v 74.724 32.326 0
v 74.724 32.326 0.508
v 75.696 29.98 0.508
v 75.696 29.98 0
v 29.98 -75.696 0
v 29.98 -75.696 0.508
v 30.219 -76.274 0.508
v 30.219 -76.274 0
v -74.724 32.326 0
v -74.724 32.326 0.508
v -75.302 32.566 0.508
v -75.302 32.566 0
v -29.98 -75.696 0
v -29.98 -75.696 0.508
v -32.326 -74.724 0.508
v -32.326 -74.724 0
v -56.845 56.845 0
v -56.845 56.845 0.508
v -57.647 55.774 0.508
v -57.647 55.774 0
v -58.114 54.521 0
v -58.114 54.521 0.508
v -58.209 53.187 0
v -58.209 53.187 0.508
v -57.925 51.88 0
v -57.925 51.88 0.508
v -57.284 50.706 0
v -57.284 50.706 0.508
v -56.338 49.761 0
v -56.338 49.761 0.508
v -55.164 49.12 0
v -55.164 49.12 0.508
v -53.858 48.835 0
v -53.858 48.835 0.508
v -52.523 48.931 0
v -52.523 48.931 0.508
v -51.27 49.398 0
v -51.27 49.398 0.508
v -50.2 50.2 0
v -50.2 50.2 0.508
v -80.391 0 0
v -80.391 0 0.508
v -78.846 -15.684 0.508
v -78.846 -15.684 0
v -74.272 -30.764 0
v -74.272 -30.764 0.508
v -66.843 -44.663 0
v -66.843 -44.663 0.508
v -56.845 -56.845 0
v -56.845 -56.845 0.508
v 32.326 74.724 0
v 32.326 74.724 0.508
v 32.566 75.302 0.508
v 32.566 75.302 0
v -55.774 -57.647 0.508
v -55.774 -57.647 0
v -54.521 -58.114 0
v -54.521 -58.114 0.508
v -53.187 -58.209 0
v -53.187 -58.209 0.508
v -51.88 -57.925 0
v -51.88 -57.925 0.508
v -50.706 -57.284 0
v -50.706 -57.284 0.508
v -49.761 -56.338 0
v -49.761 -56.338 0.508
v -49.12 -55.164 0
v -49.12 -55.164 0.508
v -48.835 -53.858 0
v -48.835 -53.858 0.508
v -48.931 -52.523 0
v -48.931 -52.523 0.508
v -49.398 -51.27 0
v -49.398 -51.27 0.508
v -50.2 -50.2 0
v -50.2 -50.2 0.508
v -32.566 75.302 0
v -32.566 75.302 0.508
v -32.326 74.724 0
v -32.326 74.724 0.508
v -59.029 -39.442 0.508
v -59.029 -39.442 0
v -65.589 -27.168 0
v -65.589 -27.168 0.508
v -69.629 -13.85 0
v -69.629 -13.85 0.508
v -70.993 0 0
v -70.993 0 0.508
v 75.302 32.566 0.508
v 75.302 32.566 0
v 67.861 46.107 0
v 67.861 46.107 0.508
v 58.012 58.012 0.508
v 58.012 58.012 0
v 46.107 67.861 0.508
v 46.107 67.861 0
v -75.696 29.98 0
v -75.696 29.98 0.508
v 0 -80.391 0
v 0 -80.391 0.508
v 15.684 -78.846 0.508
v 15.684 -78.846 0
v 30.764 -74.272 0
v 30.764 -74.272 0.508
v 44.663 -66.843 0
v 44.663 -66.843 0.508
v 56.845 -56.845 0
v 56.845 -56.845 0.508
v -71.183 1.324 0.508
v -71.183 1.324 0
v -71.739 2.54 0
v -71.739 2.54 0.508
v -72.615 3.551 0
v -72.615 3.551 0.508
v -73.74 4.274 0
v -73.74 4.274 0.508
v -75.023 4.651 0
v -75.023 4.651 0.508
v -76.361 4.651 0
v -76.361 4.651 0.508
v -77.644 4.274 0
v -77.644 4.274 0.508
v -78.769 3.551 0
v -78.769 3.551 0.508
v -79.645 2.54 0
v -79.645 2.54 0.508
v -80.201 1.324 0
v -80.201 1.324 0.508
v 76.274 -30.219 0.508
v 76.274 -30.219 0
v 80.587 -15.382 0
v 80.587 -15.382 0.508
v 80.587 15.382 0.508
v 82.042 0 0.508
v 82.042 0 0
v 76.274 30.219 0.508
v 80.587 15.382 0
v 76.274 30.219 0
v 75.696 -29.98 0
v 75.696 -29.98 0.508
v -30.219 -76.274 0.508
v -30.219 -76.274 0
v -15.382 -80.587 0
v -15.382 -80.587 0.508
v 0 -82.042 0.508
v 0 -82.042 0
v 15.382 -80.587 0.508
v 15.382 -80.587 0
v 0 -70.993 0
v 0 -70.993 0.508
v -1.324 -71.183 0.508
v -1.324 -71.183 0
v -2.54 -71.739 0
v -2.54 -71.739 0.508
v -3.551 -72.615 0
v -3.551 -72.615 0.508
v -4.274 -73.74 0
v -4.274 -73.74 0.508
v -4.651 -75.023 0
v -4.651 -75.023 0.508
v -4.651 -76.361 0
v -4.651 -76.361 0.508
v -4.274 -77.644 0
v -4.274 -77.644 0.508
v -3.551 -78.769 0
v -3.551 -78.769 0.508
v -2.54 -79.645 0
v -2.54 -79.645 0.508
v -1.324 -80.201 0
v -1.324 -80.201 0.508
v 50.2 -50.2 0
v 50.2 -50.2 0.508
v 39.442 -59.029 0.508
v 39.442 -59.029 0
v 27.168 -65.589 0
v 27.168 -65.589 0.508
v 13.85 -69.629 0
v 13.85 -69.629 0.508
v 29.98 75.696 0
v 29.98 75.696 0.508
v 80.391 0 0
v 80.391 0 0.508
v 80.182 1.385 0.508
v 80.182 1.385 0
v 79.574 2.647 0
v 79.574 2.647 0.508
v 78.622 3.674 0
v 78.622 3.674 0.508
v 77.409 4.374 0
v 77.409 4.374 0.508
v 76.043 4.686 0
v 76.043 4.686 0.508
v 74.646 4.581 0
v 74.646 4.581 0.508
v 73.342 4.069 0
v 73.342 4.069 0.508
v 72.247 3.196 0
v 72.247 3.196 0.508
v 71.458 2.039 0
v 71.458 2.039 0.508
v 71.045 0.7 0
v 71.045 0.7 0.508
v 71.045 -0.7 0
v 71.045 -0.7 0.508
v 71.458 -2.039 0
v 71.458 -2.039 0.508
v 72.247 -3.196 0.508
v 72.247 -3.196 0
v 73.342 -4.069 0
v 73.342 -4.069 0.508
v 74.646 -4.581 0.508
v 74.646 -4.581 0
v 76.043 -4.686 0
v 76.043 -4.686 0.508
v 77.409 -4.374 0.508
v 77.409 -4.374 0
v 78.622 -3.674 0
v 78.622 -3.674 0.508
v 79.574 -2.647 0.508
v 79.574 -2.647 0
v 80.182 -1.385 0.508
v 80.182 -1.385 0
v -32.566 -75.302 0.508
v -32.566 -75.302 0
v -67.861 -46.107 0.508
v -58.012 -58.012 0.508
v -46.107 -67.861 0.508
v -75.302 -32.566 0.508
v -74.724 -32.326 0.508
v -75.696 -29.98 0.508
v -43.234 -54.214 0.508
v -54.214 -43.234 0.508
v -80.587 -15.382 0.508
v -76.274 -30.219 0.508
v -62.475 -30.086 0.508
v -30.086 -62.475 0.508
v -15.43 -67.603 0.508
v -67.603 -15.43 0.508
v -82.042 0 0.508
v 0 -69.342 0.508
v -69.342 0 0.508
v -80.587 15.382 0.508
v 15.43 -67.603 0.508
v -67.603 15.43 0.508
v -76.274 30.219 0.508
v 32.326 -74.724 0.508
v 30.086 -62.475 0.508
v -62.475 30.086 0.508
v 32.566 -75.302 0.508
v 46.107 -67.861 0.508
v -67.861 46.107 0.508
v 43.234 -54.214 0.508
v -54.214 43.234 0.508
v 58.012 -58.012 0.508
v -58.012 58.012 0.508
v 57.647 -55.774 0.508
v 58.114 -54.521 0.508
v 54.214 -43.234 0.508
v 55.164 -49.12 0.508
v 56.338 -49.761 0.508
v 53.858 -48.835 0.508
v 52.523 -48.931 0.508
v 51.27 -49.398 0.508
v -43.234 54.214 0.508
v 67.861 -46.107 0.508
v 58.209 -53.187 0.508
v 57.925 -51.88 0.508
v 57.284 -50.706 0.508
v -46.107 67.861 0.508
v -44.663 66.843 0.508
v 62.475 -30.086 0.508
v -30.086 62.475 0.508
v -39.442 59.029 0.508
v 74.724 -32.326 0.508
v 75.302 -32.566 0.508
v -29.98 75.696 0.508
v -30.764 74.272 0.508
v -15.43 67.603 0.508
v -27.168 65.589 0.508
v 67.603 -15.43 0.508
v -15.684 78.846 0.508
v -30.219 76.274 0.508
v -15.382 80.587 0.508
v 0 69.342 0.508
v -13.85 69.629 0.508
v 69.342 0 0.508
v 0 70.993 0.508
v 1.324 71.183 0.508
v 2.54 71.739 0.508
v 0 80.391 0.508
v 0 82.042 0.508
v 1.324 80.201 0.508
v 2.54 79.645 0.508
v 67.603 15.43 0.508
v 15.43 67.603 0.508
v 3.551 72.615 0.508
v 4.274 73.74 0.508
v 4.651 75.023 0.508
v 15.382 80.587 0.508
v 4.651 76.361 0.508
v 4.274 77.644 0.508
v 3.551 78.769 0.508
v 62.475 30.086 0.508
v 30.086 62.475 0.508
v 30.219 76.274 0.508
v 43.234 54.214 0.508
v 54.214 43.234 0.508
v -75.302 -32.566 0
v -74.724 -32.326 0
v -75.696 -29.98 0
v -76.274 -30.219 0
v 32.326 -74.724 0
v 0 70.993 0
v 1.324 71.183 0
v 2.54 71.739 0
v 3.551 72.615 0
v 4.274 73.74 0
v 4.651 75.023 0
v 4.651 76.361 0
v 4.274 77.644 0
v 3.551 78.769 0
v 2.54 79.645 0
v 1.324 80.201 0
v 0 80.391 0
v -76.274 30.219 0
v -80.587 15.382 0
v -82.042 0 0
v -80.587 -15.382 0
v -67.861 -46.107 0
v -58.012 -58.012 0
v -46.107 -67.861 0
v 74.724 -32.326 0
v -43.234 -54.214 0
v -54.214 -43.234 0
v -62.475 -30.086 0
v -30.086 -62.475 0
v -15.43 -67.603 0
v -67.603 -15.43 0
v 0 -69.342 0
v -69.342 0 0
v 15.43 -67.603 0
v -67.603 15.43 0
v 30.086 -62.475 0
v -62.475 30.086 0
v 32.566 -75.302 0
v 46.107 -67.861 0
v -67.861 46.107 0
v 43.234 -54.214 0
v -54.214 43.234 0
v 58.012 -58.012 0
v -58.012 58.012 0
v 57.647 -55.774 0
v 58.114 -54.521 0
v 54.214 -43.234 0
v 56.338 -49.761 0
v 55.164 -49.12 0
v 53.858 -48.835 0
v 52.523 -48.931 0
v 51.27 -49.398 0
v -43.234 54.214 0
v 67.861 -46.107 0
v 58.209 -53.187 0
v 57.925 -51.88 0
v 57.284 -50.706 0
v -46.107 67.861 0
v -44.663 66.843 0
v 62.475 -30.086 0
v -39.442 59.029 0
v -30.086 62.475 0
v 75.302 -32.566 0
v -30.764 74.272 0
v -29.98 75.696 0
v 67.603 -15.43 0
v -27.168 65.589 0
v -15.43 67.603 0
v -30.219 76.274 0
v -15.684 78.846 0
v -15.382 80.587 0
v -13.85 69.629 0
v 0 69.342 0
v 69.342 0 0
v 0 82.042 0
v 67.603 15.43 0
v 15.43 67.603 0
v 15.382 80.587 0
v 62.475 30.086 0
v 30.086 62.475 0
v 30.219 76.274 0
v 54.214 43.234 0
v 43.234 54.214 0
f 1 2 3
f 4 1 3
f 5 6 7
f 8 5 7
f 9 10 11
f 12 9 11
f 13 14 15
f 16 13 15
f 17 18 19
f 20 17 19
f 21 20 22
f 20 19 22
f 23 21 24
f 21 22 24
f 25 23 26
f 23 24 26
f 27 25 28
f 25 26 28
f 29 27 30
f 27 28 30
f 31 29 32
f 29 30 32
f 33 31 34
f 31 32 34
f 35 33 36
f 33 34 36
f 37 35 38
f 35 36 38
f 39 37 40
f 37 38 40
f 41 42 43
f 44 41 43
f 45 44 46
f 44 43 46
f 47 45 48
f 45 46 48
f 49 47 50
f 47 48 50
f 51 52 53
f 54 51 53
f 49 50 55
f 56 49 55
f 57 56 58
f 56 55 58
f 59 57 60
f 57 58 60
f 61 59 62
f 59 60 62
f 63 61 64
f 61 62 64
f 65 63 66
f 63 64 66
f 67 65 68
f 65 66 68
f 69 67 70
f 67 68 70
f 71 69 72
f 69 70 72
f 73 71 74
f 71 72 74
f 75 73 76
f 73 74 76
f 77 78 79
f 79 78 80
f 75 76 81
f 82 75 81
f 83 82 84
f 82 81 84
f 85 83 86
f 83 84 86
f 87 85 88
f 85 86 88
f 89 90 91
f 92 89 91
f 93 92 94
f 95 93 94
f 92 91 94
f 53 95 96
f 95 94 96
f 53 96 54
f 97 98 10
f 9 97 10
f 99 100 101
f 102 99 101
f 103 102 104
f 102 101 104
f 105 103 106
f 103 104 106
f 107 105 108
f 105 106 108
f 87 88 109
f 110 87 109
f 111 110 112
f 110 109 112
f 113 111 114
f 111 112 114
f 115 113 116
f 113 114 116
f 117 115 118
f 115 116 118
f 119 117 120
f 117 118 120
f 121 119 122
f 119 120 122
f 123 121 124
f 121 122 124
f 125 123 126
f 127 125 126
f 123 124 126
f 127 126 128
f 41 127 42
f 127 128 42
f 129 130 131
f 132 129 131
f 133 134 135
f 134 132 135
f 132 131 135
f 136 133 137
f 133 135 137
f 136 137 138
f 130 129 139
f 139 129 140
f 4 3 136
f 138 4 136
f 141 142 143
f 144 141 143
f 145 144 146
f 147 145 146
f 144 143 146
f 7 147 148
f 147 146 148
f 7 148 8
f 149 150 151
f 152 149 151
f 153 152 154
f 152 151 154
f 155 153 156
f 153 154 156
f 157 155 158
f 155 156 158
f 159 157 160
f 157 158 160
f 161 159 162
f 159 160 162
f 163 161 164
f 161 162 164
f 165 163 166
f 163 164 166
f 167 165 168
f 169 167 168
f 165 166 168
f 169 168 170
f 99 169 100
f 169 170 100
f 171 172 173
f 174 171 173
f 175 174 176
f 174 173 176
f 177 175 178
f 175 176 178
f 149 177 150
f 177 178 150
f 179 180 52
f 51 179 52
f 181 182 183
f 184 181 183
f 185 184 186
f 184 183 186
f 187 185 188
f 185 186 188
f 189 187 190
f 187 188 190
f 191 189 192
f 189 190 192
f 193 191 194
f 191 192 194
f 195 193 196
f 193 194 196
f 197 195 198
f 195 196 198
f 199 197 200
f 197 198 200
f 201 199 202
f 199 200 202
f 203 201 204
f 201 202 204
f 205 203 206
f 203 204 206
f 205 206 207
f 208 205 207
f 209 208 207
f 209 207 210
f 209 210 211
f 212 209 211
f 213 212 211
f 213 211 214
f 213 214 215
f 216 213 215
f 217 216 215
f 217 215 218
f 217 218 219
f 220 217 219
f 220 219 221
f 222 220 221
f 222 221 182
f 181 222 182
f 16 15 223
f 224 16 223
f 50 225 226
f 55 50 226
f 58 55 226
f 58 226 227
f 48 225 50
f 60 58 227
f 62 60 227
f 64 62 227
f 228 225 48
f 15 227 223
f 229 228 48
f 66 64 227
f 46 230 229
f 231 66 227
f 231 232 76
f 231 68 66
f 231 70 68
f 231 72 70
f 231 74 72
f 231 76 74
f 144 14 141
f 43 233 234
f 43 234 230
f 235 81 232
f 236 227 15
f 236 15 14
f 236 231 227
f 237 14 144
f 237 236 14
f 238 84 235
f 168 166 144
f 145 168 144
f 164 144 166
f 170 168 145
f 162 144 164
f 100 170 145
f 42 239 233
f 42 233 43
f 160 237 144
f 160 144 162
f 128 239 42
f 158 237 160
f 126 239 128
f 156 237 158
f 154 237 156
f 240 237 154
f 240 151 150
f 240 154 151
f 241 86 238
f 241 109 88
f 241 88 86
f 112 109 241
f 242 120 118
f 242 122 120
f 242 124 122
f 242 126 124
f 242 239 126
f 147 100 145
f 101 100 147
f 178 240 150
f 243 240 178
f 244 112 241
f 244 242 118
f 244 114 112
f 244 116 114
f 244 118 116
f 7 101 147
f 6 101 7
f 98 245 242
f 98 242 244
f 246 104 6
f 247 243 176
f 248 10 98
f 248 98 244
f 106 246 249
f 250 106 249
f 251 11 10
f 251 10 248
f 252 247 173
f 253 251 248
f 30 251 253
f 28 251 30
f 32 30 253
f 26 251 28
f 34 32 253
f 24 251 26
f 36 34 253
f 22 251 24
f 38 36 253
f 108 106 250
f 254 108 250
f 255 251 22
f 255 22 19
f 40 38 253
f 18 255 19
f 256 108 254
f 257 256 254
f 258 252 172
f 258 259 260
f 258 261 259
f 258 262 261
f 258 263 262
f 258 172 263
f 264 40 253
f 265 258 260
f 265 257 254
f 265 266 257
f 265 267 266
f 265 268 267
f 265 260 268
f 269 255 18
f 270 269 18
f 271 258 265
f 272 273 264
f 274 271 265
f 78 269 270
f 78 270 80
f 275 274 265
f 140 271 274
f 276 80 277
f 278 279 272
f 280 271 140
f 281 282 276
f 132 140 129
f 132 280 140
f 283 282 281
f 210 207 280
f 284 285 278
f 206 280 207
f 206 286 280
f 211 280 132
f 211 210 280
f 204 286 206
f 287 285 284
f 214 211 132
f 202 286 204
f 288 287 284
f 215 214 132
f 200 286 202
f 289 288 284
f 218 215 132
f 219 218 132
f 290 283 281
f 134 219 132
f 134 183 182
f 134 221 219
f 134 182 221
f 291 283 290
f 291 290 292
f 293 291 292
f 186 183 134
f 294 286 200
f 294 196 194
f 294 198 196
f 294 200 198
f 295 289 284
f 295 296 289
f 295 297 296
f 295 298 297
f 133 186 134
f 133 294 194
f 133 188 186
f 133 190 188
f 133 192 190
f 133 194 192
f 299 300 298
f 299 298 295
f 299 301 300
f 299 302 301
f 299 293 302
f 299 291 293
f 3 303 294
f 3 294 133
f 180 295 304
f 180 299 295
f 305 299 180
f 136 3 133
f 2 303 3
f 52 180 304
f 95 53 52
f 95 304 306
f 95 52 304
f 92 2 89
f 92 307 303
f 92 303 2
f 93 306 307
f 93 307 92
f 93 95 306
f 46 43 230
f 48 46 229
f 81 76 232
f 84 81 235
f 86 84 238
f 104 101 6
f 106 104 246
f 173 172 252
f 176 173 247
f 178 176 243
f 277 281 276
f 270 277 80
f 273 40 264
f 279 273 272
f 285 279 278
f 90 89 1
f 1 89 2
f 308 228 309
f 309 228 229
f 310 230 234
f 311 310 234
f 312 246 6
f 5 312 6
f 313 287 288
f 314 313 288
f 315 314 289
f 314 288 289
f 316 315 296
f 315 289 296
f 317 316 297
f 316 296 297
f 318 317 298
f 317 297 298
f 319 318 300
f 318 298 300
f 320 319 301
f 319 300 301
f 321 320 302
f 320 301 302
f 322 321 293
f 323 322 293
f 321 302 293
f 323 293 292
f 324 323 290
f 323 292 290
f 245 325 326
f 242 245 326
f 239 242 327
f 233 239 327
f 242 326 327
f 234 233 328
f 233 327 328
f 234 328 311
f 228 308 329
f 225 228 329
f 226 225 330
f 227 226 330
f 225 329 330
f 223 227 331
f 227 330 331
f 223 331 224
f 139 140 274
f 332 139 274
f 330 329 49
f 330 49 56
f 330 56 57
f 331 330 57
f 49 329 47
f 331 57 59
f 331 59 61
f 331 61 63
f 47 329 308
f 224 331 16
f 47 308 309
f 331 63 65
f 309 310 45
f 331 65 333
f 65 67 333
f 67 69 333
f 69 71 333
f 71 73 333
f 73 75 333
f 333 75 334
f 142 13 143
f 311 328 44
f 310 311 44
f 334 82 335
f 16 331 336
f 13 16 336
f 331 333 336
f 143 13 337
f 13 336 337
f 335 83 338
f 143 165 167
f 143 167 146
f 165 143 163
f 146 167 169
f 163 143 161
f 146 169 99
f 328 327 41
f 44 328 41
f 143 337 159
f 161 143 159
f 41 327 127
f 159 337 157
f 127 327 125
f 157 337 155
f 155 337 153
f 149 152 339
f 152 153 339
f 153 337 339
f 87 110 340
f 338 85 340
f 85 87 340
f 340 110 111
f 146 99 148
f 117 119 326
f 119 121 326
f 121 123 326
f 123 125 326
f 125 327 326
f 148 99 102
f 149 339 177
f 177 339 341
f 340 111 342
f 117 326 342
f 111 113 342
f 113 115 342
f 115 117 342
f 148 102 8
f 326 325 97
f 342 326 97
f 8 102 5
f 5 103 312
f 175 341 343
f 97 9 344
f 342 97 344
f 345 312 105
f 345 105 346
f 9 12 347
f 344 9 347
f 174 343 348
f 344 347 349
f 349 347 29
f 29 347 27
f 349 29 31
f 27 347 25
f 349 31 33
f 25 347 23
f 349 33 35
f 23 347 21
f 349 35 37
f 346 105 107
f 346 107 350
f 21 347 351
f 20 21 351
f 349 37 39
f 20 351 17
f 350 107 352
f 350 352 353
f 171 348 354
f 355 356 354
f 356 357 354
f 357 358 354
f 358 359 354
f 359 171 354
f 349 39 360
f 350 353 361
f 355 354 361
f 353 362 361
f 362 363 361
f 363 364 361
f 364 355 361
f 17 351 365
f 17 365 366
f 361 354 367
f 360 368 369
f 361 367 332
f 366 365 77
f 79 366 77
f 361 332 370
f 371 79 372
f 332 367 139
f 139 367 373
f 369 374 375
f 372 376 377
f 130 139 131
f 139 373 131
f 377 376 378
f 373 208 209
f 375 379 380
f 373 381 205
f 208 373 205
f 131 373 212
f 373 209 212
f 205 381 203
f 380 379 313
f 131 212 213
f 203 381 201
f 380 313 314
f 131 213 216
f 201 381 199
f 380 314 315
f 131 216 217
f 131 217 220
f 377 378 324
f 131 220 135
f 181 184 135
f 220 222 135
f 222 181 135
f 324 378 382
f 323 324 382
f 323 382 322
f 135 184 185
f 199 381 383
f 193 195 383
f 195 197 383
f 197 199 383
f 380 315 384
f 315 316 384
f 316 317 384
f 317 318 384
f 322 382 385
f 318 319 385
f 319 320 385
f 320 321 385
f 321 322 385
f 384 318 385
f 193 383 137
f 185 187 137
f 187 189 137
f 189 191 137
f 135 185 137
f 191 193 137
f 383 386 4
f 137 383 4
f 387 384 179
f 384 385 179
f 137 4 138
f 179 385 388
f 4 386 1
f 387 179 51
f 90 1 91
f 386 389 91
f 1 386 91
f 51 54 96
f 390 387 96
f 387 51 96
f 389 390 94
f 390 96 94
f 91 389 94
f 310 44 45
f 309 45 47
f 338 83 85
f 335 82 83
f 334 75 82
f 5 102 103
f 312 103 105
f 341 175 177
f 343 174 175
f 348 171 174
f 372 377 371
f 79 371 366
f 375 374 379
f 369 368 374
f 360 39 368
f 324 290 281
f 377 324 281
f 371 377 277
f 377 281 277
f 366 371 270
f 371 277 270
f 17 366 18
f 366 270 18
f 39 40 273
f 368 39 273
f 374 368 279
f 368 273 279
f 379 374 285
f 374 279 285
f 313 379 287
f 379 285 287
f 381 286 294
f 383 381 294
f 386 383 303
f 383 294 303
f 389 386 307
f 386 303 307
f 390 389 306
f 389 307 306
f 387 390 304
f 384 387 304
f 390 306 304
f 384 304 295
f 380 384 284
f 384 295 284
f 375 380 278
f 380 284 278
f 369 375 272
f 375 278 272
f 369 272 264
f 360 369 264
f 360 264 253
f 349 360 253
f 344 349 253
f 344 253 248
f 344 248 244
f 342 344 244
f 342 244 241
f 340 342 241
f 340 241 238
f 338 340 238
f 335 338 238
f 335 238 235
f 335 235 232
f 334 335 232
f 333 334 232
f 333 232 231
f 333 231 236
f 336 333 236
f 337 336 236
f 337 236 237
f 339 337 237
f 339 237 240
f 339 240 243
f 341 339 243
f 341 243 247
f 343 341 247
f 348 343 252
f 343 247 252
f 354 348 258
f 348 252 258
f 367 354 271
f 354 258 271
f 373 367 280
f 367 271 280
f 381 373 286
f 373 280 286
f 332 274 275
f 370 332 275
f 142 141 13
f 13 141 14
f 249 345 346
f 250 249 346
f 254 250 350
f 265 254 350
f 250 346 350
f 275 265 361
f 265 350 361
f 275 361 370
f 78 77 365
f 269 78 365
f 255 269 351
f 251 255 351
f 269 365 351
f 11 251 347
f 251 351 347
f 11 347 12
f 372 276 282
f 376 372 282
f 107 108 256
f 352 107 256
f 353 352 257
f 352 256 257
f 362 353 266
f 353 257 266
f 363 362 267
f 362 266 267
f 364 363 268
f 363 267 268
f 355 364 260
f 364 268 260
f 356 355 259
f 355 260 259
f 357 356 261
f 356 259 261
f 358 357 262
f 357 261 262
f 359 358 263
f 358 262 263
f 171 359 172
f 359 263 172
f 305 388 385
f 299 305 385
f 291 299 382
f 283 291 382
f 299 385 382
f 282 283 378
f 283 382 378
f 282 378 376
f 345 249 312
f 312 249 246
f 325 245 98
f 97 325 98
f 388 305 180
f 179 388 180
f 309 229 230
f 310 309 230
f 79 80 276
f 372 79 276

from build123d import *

# Parameters (mm, degrees)
SKETCH4_R           = 82.042
BOSS_EXTRUDE2_DEPTH = 0.508
SKETCH5_R           = 69.342
CUT_EXTRUDE5_DEPTH  = 1.508
SKETCH6_R           = 4.699
CUT_EXTRUDE6_DEPTH  = 1.508
CUT_EXTRUDE11_DEPTH = 1.508


with BuildPart() as part:
    # Sketch4 → Boss-Extrude2 (new body)
    with BuildSketch(Plane.XY):
        Circle(SKETCH4_R)
    extrude(amount=BOSS_EXTRUDE2_DEPTH)

    # Sketch5 → Cut-Extrude5 (cut, through all)
    with BuildSketch(Plane.XY.offset(0.508)):
        Circle(SKETCH5_R)
    extrude(amount=-CUT_EXTRUDE5_DEPTH, mode=Mode.SUBTRACT)

    # Sketch6 → Cut-Extrude6 (cut, through all)
    with BuildSketch(Plane.XY.offset(0.508)):
        with Locations((75.692, 0)):
            Circle(SKETCH6_R)
        with BuildLine():
            ThreePointArc((56.845020598, -56.845021895), (56.845021284, -50.199631755), (50.199631144, -50.199632289))
            ThreePointArc((50.199631144, -50.199632289), (27.167844051, -65.588980009), (-1.058e-06, -70.993))
            ThreePointArc((-1.058e-06, -70.993), (-4.699, -75.69199993), (-1.198e-06, -80.391))
            ThreePointArc((-1.198e-06, -80.391), (30.764302834, -74.271599903), (56.845020598, -56.845021895))
        make_face()
        with BuildLine():
            ThreePointArc((-56.845021895, -56.845020598), (-50.199631755, -56.845021284), (-50.199632289, -50.199631144))
            ThreePointArc((-50.199632289, -50.199631144), (-65.588980009, -27.167844051), (-70.993, 1.058e-06))
            ThreePointArc((-70.993, 1.058e-06), (-75.69199993, 4.699), (-80.391, 1.198e-06))
            ThreePointArc((-80.391, 1.198e-06), (-74.271599903, -30.764302834), (-56.845021895, -56.845020598))
        make_face()
        with BuildLine():
            ThreePointArc((-56.845020598, 56.845021895), (-56.845021284, 50.199631755), (-50.199631144, 50.199632289))
            ThreePointArc((-50.199631144, 50.199632289), (-27.167844051, 65.588980009), (1.058e-06, 70.993))
            ThreePointArc((1.058e-06, 70.993), (4.699, 75.69199993), (1.198e-06, 80.391))
            ThreePointArc((1.198e-06, 80.391), (-30.764302834, 74.271599903), (-56.845020598, 56.845021895))
        make_face()
    extrude(amount=-CUT_EXTRUDE6_DEPTH, mode=Mode.SUBTRACT)

    # Sketch8 → Cut-Extrude11 (cut, through all)
    with BuildSketch(Plane.XY.offset(0.508)):
        Polygon((76.869596069, 30.465791131), (75.89758015, 32.812445144), (74.724253144, 32.326437185), (75.696269062, 29.979783172), align=None)
        Polygon((-30.465791131, 76.869596069), (-32.812445144, 75.89758015), (-32.326437185, 74.724253144), (-29.979783172, 75.696269062), align=None)
        Polygon((-75.89758015, 32.812445144), (-76.869596069, 30.465791131), (-75.696269062, 29.979783172), (-74.724253144, 32.326437185), align=None)
        Polygon((-76.869596069, -30.465791131), (-75.89758015, -32.812445144), (-74.724253144, -32.326437185), (-75.696269062, -29.979783172), align=None)
        Polygon((-32.812445144, -75.89758015), (-30.465791131, -76.869596069), (-29.979783172, -75.696269062), (-32.326437185, -74.724253144), align=None)
        Polygon((30.465791131, -76.869596069), (32.812445144, -75.89758015), (32.326437185, -74.724253144), (29.979783172, -75.696269062), align=None)
        Polygon((75.89758015, -32.812445144), (76.869596069, -30.465791131), (75.696269062, -29.979783172), (74.724253144, -32.326437185), align=None)
        Polygon((32.812445144, 75.89758015), (30.465791131, 76.869596069), (29.979783172, 75.696269062), (32.326437185, 74.724253144), align=None)
    extrude(amount=-CUT_EXTRUDE11_DEPTH, mode=Mode.SUBTRACT)


solid = part.part
